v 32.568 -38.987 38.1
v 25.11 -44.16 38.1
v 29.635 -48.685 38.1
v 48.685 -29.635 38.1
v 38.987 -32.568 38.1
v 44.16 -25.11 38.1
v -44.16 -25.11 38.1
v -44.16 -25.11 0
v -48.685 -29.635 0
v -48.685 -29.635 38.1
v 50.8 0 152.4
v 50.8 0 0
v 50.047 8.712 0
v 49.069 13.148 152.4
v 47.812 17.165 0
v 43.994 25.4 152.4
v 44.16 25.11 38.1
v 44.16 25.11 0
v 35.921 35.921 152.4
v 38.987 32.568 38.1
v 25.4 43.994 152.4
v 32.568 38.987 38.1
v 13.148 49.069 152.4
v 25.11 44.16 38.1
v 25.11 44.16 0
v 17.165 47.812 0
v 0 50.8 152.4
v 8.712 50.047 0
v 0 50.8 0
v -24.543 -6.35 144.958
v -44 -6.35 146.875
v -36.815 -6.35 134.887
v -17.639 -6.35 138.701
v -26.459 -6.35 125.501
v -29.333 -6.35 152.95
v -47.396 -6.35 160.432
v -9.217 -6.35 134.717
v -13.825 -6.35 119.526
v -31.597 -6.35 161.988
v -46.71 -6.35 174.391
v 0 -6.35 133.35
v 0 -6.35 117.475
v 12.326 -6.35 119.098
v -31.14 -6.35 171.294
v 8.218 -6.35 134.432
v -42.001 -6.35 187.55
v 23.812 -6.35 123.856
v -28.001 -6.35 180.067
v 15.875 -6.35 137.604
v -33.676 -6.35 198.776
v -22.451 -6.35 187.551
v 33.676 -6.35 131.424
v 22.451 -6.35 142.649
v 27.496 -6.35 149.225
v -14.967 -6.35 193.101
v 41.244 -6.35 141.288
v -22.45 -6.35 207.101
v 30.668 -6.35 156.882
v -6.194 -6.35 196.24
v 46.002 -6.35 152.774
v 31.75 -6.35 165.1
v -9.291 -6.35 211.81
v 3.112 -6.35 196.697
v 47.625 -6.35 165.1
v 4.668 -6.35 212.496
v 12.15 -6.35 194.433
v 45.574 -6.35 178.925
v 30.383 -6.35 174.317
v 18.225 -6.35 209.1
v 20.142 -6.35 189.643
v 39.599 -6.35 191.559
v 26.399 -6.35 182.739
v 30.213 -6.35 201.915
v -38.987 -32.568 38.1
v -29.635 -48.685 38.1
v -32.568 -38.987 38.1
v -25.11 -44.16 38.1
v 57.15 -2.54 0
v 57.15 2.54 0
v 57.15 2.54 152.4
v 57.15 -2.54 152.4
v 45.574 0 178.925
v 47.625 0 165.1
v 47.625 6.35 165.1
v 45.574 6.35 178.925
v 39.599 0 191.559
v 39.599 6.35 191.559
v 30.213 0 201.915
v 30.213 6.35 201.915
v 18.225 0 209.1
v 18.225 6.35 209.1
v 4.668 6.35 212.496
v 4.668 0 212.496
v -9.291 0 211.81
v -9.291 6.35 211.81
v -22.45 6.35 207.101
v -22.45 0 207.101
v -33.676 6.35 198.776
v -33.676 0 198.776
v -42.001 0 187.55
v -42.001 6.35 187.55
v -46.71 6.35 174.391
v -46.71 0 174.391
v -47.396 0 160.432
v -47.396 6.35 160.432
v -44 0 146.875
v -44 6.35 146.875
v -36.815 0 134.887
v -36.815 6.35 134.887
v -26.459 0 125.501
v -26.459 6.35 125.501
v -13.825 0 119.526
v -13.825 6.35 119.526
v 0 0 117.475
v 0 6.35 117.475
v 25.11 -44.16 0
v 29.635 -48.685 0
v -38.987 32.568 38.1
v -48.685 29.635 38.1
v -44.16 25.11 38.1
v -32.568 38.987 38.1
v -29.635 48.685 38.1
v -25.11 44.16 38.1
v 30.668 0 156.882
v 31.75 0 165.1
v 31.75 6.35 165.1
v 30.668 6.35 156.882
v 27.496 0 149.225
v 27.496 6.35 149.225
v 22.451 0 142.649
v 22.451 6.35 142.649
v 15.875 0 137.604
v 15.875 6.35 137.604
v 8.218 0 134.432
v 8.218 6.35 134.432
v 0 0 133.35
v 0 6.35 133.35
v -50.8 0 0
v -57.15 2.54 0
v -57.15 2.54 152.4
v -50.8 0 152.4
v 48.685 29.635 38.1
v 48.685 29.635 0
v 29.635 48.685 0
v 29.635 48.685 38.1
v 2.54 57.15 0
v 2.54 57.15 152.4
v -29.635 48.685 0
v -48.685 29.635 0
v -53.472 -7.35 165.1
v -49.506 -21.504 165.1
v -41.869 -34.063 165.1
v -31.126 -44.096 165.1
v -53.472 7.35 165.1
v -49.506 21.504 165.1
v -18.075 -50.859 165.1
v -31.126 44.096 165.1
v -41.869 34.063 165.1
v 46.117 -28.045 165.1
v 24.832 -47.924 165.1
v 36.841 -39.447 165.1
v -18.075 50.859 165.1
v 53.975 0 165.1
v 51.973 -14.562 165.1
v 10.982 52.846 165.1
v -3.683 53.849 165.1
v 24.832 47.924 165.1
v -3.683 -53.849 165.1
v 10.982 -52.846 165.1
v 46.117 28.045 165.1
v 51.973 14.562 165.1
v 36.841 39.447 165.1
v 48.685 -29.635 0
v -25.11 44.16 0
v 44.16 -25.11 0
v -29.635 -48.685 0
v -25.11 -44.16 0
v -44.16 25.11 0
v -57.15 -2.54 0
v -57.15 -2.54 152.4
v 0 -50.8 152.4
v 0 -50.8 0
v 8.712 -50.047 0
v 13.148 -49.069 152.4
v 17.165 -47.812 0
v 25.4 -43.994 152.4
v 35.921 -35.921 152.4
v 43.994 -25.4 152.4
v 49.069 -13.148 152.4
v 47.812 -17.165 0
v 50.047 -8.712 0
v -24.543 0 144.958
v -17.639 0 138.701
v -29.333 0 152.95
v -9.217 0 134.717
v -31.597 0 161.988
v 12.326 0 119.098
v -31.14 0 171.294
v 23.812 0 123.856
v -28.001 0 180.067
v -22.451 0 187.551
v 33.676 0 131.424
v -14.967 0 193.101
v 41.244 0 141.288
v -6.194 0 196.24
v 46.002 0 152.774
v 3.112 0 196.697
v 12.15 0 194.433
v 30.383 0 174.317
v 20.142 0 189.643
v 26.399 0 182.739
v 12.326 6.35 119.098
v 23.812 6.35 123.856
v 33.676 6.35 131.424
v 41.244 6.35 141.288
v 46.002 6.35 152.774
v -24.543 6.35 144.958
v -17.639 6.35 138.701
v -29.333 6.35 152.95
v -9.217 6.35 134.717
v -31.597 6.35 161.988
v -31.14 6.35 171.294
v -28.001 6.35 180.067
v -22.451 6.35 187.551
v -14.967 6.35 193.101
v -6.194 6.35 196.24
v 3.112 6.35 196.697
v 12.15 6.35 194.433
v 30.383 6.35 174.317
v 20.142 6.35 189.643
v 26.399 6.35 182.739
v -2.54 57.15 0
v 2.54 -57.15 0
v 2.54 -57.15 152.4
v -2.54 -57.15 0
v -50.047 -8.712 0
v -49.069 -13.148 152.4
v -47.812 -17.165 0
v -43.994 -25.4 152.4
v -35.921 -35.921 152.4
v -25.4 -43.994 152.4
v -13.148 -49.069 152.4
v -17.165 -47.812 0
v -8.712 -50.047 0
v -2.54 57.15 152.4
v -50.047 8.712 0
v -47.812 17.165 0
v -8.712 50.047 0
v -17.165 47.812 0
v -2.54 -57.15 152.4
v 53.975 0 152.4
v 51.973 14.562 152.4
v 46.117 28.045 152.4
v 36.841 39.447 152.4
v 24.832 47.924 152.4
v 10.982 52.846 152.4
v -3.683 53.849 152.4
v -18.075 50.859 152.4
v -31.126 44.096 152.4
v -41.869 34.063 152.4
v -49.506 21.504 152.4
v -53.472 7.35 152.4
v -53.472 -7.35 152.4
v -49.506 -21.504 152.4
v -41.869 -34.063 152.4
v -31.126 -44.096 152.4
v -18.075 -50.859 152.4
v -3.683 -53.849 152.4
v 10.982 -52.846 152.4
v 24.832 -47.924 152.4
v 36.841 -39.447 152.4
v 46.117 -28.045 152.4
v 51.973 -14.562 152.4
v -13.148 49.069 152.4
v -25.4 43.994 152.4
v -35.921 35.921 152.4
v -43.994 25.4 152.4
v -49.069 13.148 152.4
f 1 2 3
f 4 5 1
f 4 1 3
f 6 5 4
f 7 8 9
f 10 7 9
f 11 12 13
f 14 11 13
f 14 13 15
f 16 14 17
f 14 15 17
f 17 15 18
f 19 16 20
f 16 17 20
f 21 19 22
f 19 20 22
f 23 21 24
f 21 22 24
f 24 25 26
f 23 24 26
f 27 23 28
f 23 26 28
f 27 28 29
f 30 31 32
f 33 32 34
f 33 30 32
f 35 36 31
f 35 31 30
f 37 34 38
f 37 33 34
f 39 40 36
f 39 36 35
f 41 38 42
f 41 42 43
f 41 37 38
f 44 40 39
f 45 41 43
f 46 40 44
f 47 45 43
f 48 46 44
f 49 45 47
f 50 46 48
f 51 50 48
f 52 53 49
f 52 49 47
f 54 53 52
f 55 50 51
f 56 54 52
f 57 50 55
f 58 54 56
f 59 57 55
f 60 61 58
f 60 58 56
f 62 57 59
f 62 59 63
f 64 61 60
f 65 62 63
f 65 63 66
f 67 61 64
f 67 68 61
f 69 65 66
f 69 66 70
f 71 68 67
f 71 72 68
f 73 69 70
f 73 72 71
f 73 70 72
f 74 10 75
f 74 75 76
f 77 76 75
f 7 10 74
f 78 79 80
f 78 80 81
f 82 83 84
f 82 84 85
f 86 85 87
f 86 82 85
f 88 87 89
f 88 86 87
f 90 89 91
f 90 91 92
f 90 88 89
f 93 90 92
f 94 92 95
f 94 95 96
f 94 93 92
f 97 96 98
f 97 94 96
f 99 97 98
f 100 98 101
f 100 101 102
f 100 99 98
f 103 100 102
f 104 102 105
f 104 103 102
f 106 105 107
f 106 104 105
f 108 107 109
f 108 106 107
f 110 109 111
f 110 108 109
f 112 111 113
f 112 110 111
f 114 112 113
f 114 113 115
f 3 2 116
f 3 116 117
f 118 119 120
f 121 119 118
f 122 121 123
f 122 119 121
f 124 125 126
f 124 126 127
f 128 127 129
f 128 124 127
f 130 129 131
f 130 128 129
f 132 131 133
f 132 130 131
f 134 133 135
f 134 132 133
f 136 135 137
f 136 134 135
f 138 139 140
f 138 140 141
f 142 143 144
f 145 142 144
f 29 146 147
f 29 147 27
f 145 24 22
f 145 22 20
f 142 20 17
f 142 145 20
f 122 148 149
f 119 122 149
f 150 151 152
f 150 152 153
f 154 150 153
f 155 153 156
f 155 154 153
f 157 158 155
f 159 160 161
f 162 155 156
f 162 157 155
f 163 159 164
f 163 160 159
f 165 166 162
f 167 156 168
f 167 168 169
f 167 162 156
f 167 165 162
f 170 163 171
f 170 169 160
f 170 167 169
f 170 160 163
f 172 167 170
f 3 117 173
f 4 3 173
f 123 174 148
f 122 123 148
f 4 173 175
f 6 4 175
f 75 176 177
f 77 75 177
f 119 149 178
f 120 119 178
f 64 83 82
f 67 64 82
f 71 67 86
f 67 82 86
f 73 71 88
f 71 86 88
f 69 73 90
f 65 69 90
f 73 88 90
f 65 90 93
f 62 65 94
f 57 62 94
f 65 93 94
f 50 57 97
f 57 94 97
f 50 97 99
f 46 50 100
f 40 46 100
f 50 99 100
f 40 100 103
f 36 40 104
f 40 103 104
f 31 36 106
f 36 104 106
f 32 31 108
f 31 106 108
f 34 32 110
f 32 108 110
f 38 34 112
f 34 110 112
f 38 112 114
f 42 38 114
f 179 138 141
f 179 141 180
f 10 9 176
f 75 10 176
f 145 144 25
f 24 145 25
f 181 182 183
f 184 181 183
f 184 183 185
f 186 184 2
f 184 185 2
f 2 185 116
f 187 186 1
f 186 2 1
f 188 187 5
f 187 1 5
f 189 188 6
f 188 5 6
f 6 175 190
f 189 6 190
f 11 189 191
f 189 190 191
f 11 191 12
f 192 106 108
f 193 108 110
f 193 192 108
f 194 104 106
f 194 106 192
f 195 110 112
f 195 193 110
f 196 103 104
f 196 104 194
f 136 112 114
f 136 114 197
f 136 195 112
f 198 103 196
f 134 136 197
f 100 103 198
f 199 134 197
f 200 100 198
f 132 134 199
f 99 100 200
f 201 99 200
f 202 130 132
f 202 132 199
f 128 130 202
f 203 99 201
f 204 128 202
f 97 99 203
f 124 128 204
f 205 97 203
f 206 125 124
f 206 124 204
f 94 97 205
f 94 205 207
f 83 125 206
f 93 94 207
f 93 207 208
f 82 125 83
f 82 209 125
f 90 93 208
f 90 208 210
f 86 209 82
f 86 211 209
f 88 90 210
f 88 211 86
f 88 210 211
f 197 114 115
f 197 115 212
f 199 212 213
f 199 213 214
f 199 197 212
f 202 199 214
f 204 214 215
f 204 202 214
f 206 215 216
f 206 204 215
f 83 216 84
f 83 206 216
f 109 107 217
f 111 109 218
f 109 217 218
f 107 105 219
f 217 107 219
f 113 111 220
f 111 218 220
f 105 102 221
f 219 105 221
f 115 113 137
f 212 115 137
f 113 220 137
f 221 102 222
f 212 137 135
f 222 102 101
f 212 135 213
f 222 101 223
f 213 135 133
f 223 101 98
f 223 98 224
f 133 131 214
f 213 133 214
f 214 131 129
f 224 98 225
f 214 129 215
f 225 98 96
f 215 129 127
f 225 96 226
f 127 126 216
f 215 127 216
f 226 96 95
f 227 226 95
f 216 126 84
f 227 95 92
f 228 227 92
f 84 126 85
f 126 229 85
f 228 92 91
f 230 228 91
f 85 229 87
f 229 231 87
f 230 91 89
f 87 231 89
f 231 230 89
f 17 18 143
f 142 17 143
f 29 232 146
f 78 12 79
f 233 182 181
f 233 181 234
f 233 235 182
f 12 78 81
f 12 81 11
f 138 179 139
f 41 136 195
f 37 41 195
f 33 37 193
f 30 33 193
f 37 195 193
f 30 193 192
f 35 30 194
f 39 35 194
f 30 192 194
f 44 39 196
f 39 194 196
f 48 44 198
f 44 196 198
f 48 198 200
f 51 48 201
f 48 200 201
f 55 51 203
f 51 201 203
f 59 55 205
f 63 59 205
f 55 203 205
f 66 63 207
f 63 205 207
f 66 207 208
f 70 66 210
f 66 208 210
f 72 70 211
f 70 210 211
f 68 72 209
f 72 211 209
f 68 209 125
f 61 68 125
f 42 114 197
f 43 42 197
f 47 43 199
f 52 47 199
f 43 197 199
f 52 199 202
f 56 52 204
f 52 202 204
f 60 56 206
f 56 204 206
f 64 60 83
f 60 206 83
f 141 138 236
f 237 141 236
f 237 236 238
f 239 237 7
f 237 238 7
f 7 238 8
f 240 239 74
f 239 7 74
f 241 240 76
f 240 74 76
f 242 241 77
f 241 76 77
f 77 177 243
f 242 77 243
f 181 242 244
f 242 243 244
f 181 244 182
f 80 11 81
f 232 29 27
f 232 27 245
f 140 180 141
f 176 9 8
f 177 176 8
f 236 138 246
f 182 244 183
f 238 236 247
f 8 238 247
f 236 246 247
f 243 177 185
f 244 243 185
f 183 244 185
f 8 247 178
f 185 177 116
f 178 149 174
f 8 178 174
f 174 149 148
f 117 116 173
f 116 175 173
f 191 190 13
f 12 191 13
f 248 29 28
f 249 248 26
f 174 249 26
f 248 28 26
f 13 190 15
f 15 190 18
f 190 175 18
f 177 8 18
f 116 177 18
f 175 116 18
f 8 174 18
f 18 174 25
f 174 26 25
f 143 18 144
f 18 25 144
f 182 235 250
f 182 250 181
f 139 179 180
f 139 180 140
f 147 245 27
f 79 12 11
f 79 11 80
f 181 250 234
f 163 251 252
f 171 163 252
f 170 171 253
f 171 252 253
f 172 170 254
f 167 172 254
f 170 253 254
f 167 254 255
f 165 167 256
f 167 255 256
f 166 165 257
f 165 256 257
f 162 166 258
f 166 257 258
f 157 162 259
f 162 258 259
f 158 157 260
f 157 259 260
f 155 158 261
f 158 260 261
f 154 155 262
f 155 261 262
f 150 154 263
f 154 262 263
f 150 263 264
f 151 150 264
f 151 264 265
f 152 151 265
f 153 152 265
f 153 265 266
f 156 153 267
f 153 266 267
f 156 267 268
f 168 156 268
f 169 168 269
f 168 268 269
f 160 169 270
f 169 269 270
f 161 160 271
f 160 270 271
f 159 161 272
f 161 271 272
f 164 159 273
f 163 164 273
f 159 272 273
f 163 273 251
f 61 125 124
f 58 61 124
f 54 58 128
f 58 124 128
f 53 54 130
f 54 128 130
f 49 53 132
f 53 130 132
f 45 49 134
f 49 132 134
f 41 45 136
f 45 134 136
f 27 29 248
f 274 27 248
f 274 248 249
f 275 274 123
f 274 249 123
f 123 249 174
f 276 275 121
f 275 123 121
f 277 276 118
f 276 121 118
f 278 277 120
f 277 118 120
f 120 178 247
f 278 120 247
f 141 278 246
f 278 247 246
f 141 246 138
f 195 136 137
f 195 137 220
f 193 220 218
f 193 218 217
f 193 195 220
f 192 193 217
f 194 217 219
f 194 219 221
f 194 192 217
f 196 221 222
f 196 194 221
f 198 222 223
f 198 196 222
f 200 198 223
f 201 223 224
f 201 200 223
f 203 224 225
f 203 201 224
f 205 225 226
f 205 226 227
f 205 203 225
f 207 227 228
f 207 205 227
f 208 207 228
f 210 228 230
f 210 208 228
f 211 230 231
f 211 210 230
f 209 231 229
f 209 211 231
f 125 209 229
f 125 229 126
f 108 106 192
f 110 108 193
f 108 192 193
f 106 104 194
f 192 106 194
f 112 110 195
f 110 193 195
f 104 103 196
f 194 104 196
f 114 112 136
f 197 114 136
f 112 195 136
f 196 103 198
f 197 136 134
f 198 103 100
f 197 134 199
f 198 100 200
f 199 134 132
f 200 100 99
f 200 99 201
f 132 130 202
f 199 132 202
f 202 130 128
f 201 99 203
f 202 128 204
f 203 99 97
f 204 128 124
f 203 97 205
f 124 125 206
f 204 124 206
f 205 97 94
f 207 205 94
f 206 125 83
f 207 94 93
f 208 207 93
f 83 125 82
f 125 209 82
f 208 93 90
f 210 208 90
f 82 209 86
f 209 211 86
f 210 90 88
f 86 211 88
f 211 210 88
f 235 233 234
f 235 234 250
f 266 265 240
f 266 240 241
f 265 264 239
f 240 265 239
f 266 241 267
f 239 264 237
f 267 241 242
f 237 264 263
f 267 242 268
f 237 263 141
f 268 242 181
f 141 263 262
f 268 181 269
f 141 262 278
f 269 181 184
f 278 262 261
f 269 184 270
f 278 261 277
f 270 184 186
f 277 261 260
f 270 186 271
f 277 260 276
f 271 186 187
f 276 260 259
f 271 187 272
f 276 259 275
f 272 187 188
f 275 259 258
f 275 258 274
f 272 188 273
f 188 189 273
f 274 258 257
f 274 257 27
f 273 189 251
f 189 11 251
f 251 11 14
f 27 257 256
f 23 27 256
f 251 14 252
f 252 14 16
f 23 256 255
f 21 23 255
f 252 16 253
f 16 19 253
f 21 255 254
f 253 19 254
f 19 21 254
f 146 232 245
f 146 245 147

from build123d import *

# Parameters (mm, degrees)
F1_DEPTH  = 152.4
F4_DEPTH  = 38.1
F2_R      = 53.975
F5_DEPTH  = 12.7
F7_DEPTH  = 6.35
F10_DEPTH = 152.4


with BuildPart() as f1:
    # F0 (on Top) → F1 (new body)
    with BuildSketch(Plane.XY):
        with BuildLine():
            Line((0, 0), (50.8, 0))
            ThreePointArc((50.8, 0), (35.921024, 35.921024), (0, 50.8))
            Line((0, 50.8), (0, 0))
        make_face()
        with BuildLine():
            ThreePointArc((-50.8, 0), (-35.921024, -35.921024), (0, -50.8))
            Line((0, -50.8), (0, 0))
            Line((0, 0), (-50.8, 0))
        make_face()
        with BuildLine():
            ThreePointArc((0, -50.8), (35.921024, -35.921024), (50.8, 0))
            Line((50.8, 0), (0, 0))
            Line((0, 0), (0, -50.8))
        make_face()
        with BuildLine():
            Line((0, 0), (0, 50.8))
            ThreePointArc((0, 50.8), (-35.921024, 35.921024), (-50.8, 0))
            Line((-50.8, 0), (0, 0))
        make_face()
    extrude(amount=F1_DEPTH)

    # F3 (on Top) → F4 (join)
    with BuildSketch(Plane.XY):
        Polygon((-39.546579, 20.496579), (-20.496579, 39.546579), (-29.634845, 48.684845), (-48.684845, 29.634845), align=None)
        Polygon((29.634845, 48.684845), (19.783476, 38.833476), (38.833476, 19.783476), (48.684845, 29.634845), align=None)
        Polygon((-29.634845, -48.684845), (-18.642513, -37.692513), (-37.692513, -18.642513), (-48.684845, -29.634845), align=None)
        Polygon((33.867423, -14.817423), (14.817423, -33.867423), (29.634845, -48.684845), (48.684845, -29.634845), align=None)
    extrude(amount=F4_DEPTH)

    # F2 (on face) → F5 (join)
    with BuildSketch(Plane.XY.offset(152.4)):
        Circle(F2_R)
    extrude(amount=F5_DEPTH)


with BuildPart() as f7:
    # F6 (on Front) → F7 (new body)
    with BuildSketch(Plane.XZ):
        with BuildLine():
            ThreePointArc((31.75, 165.1), (-22.45064, 187.55064), (0, 133.35))
            ThreePointArc((0, 133.35), (22.45064, 142.64936), (31.75, 165.1))
        make_face()
        with BuildLine():
            ThreePointArc((47.625, 165.1), (-33.67596, 198.77596), (0, 117.475))
            ThreePointArc((0, 117.475), (33.67596, 131.42404), (47.625, 165.1))
        make_face()
        with BuildLine():
            ThreePointArc((31.75, 165.1), (22.45064, 142.64936), (0, 133.35))
            ThreePointArc((0, 133.35), (-22.45064, 187.55064), (31.75, 165.1))
        make_face(mode=Mode.SUBTRACT)
    extrude(amount=F7_DEPTH)


with BuildPart() as f8_1:
    # F8: instance of F7
    add(f7.part.mirror(Plane.XZ))


with BuildPart() as f10:
    # F9 (on face) → F10 (new body)
    with BuildSketch(Plane(origin=(0, 0, 0), x_dir=(1, 0, 0), z_dir=(0, 0, -1))):
        Polygon((0, -57.15), (0, -50.8), (-2.54, -57.15), align=None)
        Polygon((2.54, -57.15), (0, -50.8), (0, -57.15), align=None)
        Polygon((57.15, 0), (50.8, 0), (57.15, -2.54), align=None)
        Polygon((57.15, 2.54), (50.8, 0), (57.15, 0), align=None)
        Polygon((0, 57.15), (0, 50.8), (2.54, 57.15), align=None)
        Polygon((-2.54, 57.15), (0, 50.8), (0, 57.15), align=None)
        Polygon((-57.15, -2.54), (-50.8, 0), (-57.15, 0), align=None)
        Polygon((-57.15, 0), (-50.8, 0), (-57.15, 2.54), align=None)
    extrude(amount=-F10_DEPTH)


solid = Compound([f1.part, f7.part, f8_1.part, f10.part])
